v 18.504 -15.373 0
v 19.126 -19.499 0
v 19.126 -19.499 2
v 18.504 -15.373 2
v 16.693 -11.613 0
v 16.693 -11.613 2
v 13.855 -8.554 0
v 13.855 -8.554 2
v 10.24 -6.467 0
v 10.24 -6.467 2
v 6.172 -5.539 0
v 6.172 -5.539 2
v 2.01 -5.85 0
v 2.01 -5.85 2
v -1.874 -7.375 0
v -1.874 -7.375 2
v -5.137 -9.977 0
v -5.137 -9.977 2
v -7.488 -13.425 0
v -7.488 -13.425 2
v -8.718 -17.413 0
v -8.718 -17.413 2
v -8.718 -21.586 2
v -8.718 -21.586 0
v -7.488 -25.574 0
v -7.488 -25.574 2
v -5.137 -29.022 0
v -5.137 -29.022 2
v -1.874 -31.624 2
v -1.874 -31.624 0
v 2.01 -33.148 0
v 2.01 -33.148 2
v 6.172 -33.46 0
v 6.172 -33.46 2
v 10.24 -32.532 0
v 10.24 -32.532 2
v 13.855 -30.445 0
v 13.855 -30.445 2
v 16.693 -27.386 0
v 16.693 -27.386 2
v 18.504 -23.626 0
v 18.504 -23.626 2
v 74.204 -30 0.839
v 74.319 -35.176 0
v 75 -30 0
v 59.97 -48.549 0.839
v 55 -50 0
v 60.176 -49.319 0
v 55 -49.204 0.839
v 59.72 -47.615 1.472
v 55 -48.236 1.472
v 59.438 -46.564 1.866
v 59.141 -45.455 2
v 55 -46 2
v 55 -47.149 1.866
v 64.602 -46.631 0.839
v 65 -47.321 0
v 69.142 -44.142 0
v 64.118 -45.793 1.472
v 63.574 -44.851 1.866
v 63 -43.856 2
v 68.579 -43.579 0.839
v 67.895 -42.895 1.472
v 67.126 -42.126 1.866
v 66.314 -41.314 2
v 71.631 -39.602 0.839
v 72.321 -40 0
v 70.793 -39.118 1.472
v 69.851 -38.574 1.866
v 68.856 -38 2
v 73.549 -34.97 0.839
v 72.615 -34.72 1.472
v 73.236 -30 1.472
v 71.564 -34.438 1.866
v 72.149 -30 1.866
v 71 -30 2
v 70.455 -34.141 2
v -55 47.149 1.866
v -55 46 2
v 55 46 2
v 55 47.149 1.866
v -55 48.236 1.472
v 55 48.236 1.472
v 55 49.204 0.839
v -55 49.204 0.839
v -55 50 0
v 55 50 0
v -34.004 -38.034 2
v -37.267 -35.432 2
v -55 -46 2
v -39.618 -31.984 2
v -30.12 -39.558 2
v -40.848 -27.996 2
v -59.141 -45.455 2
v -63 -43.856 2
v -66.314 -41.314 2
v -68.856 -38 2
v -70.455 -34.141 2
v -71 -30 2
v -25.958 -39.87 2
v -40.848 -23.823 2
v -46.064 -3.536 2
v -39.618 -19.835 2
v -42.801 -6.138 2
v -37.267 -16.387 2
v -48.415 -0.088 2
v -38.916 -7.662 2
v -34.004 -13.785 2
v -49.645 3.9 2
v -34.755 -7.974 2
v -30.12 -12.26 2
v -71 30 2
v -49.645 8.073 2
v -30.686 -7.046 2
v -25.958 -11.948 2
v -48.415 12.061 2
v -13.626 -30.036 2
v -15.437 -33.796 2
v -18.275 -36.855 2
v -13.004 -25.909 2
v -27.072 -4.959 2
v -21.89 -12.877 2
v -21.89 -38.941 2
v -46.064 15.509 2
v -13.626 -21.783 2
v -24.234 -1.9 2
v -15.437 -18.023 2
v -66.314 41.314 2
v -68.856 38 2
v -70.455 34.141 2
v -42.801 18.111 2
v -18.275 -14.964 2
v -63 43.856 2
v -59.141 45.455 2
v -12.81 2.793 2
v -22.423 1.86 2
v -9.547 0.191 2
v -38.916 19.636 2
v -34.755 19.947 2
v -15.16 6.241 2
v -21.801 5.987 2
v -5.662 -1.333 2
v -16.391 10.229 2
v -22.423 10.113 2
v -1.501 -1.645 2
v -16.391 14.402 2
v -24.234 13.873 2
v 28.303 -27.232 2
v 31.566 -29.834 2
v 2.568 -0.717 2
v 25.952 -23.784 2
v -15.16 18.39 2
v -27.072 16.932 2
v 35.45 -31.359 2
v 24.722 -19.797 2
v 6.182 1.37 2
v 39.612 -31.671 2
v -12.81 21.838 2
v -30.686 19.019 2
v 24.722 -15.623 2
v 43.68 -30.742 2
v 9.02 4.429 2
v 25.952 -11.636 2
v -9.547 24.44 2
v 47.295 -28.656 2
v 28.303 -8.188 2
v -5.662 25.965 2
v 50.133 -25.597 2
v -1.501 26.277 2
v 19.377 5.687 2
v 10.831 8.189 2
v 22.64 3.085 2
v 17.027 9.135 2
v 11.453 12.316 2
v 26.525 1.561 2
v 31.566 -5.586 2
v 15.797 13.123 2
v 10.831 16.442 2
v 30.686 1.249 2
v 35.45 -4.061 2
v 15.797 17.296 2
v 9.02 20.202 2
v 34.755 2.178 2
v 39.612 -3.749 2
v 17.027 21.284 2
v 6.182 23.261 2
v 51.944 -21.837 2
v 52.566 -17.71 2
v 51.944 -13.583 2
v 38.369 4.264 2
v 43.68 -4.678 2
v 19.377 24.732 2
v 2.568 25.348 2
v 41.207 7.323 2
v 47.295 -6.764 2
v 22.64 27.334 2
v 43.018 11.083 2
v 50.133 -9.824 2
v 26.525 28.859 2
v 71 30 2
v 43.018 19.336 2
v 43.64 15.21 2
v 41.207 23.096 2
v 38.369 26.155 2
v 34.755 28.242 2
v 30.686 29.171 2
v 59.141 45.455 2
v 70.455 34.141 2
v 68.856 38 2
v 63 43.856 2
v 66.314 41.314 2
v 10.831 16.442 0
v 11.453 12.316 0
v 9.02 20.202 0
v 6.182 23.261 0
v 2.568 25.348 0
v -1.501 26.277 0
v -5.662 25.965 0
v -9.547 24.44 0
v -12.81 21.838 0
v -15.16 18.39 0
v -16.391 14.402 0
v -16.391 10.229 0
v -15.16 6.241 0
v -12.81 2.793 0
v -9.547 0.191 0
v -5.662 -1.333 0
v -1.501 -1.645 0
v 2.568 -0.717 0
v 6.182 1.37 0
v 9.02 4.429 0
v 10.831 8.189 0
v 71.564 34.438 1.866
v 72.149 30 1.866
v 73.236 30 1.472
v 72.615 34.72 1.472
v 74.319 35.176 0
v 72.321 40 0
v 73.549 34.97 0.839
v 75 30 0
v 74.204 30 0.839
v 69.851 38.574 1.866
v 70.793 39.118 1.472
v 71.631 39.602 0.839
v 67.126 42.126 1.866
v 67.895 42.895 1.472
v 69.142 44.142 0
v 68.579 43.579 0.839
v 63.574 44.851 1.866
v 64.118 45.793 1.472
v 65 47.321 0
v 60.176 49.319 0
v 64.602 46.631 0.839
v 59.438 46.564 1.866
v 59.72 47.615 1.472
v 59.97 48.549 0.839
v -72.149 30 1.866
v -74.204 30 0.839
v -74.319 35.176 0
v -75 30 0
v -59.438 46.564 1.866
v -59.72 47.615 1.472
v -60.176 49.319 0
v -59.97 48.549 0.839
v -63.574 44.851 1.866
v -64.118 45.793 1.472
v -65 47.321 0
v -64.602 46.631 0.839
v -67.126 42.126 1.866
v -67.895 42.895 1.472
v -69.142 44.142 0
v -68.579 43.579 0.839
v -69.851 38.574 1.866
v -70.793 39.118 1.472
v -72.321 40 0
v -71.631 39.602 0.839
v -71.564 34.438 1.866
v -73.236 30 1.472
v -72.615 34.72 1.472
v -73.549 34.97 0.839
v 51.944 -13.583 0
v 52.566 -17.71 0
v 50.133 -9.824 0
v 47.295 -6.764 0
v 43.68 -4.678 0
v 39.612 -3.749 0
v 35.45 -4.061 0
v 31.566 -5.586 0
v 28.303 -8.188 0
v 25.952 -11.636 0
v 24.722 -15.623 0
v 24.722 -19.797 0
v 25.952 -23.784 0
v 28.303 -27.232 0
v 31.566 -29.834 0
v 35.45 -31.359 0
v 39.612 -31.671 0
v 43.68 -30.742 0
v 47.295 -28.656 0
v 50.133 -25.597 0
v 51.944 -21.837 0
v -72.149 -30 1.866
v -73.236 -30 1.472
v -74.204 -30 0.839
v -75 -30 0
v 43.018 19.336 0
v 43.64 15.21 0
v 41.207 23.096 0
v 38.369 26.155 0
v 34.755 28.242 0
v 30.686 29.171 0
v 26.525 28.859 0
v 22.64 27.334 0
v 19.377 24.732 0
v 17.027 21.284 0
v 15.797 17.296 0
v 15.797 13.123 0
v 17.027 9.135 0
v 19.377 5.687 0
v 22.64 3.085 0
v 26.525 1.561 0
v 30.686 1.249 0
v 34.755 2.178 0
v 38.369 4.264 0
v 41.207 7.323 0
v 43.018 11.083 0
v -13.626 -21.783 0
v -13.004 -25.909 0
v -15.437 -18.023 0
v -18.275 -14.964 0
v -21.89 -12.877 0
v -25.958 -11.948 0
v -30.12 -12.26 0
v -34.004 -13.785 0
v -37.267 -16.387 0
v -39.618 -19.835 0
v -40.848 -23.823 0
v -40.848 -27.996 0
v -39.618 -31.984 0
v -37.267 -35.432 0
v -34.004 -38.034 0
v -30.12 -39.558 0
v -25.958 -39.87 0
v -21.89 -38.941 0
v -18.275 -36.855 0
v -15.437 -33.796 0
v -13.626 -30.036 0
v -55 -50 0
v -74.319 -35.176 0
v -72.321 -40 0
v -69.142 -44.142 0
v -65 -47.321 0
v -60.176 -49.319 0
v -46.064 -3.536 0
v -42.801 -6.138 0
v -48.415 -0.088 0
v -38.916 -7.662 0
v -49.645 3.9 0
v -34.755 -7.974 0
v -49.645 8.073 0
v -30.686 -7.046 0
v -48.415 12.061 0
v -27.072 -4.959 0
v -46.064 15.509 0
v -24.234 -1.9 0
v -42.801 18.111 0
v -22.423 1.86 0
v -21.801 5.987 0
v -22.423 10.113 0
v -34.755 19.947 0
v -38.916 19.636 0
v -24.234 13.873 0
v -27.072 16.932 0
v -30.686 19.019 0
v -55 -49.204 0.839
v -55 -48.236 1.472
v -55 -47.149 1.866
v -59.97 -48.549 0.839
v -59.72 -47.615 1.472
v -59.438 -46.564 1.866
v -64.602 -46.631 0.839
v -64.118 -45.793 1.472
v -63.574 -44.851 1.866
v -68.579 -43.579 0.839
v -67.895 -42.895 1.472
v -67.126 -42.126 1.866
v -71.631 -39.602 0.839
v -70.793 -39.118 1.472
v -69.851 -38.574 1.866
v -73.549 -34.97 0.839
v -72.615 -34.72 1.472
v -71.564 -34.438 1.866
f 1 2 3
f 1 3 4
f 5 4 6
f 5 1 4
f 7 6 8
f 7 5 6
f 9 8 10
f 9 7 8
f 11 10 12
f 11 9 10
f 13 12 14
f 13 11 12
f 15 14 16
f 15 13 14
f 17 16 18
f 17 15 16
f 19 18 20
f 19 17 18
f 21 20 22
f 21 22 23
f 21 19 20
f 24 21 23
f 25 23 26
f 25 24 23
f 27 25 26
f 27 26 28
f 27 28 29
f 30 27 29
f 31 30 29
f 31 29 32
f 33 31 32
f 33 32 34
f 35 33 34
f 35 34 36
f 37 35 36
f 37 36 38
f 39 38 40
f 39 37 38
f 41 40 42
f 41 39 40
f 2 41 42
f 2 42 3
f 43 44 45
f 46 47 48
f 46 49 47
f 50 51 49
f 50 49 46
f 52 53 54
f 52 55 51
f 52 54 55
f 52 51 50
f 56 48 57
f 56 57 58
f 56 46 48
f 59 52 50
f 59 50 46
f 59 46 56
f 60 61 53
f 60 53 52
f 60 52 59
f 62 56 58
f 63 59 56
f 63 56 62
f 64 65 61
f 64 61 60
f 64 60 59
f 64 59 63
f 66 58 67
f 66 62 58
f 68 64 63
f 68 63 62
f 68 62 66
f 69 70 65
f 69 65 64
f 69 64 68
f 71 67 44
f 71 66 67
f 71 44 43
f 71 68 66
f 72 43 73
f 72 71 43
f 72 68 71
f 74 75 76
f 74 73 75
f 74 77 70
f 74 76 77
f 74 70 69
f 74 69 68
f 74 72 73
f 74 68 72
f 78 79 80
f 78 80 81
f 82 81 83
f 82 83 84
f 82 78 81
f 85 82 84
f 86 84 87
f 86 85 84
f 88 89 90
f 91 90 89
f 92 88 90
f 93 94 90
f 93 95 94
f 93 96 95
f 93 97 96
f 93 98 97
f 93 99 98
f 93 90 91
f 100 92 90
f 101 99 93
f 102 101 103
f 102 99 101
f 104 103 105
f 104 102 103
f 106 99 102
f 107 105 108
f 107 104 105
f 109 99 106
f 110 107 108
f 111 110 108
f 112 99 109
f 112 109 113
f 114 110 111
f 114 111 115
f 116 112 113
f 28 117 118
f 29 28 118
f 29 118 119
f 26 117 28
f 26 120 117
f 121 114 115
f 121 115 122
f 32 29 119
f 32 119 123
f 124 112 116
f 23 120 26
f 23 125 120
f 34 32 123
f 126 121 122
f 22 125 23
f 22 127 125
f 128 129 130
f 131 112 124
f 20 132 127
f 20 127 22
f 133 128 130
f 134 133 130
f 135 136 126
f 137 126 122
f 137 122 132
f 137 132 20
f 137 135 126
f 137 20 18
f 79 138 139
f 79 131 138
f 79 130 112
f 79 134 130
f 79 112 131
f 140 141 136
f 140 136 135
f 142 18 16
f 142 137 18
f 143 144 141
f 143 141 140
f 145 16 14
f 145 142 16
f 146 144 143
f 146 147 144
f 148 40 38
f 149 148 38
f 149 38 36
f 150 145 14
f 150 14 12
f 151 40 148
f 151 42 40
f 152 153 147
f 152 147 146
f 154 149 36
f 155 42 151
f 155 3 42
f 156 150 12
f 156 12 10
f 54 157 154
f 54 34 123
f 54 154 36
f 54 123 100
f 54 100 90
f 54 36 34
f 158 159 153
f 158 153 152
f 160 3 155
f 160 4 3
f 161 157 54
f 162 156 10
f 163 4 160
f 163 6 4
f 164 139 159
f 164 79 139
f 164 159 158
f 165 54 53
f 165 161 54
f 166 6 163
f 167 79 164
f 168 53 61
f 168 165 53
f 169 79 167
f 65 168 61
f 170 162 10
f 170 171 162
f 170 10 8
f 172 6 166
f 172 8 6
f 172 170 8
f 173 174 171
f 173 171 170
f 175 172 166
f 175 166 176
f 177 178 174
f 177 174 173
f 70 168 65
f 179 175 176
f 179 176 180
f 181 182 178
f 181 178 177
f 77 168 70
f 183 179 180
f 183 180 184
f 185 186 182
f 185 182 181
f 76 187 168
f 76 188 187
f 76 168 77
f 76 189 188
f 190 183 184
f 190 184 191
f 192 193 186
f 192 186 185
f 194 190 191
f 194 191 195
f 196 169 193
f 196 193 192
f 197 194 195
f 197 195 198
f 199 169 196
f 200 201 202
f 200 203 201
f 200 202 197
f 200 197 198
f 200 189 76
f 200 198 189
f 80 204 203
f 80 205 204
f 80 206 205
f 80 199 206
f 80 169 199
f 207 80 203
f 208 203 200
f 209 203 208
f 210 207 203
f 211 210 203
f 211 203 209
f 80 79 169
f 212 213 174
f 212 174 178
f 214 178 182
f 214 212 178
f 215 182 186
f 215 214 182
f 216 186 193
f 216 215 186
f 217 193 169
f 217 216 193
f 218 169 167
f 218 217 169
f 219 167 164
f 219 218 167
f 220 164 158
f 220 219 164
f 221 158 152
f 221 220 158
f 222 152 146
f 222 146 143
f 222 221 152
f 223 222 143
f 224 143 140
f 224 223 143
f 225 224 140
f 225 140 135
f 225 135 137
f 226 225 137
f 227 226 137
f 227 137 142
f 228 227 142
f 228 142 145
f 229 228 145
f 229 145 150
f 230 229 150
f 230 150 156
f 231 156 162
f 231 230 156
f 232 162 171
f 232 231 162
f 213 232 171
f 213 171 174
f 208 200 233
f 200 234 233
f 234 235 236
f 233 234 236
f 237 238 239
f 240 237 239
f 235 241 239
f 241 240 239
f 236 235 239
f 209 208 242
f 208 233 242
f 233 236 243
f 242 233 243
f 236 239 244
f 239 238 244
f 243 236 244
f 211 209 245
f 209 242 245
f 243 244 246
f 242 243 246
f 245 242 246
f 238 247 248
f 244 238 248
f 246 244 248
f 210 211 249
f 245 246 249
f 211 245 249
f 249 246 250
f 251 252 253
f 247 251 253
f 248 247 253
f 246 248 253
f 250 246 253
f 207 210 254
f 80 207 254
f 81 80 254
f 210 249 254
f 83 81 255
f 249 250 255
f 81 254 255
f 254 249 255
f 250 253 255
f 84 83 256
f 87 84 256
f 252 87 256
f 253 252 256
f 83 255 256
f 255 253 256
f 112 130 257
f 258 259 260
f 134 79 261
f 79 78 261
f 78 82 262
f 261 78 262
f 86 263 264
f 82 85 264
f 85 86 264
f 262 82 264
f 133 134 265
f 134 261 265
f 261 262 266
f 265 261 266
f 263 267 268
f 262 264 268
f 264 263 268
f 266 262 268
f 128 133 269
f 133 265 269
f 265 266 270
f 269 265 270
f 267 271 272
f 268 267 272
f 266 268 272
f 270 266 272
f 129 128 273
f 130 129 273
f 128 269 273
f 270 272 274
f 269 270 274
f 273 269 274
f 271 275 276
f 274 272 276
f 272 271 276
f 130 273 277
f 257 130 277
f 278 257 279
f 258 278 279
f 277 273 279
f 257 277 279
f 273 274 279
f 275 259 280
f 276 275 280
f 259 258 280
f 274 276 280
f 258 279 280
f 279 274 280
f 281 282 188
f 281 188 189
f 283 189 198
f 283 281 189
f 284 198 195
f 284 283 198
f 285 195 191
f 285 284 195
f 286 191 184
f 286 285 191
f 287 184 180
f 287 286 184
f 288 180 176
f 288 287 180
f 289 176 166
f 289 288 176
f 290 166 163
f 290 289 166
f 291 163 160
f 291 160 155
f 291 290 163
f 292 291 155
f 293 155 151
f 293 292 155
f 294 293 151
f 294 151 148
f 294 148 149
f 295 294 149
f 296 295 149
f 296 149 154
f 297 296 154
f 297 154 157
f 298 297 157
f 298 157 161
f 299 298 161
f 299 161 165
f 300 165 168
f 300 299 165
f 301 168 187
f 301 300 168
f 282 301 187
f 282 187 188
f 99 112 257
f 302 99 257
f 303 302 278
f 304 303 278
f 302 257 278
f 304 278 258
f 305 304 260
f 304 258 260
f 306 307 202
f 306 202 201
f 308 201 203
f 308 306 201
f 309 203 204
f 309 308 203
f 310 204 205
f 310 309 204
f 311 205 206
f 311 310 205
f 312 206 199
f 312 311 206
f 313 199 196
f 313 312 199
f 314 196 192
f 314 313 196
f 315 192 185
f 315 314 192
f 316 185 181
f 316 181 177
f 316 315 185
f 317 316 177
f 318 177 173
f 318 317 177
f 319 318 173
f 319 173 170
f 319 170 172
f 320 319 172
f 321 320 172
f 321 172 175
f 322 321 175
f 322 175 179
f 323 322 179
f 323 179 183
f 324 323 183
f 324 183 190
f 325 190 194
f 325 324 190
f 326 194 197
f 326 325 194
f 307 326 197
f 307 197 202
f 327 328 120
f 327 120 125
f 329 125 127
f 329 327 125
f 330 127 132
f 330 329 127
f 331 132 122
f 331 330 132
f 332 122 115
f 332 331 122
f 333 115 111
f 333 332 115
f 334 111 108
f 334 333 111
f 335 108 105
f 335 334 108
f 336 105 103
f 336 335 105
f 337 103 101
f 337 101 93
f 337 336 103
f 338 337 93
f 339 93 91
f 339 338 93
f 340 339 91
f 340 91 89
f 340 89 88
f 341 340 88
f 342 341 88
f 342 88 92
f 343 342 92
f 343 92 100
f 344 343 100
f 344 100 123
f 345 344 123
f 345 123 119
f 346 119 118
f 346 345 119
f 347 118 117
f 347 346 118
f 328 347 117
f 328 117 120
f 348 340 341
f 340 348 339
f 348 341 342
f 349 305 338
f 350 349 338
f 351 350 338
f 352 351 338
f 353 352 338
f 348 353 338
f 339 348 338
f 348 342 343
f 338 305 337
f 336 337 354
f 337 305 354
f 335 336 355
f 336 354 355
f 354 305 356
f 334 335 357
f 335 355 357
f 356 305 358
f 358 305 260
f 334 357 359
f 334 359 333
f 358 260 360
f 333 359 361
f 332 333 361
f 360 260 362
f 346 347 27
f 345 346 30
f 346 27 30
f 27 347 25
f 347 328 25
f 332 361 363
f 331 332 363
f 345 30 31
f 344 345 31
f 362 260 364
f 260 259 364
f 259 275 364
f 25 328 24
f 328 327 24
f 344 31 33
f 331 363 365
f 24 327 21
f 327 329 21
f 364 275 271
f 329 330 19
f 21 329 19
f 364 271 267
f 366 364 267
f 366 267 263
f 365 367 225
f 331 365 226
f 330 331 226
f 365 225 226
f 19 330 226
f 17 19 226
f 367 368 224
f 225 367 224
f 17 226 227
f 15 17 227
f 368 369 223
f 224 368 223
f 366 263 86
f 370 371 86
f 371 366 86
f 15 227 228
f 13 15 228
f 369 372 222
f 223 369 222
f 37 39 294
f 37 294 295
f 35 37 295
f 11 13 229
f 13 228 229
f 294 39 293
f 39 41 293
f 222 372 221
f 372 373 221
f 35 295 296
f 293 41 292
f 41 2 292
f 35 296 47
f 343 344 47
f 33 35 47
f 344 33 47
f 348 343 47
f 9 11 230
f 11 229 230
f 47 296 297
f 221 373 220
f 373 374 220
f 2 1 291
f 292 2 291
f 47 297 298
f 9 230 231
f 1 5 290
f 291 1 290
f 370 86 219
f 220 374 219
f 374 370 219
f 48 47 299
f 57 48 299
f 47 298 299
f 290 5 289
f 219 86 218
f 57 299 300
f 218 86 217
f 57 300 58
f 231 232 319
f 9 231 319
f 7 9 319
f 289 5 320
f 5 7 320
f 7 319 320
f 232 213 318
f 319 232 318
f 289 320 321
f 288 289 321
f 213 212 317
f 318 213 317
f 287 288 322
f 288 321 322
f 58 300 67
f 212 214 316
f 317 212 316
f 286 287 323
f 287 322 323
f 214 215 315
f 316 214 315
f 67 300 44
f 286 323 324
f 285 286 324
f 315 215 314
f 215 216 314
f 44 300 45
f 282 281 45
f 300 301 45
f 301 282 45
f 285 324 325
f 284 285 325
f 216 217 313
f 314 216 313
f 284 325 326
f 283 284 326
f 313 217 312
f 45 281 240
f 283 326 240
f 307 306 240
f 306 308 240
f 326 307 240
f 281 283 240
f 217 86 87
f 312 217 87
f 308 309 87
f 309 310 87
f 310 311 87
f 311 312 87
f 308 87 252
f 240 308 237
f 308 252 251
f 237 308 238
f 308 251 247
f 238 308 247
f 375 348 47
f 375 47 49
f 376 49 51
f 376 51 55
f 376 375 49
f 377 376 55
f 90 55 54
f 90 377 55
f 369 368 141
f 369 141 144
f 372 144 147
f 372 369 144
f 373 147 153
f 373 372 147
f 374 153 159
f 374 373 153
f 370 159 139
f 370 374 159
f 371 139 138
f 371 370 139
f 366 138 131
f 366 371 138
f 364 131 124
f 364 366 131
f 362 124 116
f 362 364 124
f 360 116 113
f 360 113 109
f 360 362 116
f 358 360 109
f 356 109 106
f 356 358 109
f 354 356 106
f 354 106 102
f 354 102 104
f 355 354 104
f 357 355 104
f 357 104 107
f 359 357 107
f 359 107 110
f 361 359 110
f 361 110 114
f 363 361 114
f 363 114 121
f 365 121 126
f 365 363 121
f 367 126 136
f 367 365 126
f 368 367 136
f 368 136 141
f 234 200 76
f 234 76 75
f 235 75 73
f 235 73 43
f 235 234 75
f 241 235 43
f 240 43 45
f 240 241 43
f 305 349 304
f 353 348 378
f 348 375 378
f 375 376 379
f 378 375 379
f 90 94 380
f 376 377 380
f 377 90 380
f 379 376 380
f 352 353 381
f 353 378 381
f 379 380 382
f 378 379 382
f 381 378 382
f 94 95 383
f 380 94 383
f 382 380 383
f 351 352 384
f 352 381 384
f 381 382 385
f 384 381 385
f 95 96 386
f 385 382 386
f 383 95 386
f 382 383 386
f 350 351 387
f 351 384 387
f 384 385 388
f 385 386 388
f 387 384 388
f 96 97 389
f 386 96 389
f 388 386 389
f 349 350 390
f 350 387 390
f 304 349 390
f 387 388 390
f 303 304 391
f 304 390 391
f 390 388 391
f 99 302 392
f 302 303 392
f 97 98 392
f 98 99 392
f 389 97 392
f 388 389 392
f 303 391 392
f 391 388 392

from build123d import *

# Parameters (mm, degrees)
F0_W         = 150
F0_H         = 100
F0_R         = 14
F1_DEPTH     = 2
F2_R         = 20
F3_T1_DEPTH  = 110
F3_T3_DEPTH  = 60
F3_T6_ANGLE  = 90
F3_T8_ANGLE  = 90
F3_T10_ANGLE = 90
F3_T12_ANGLE = 90


# Not quite as in the source:
# - a fillet or chamfer that OpenCascade refuses, or shapes differently, is made with other operations: its cross-section is extruded or revolved along the edge and cut away or added


with BuildPart() as f1:
    # F0 (on Top) → F1 (new body)
    with BuildSketch(Plane.XY):
        Rectangle(F0_W, F0_H)
        with Locations((-27.0043395302, -25.9092412172)):
            Circle(F0_R, mode=Mode.SUBTRACT)
        with Locations((5.1257033043, -19.4994347856)):
            Circle(F0_R, mode=Mode.SUBTRACT)
        with Locations((38.5656639238, -17.7100679294)):
            Circle(F0_R, mode=Mode.SUBTRACT)
        with Locations((-35.8011273407, 5.9865840333)):
            Circle(F0_R, mode=Mode.SUBTRACT)
        with Locations((-2.5469161856, 12.3156928879)):
            Circle(F0_R, mode=Mode.SUBTRACT)
        with Locations((29.6401518762, 15.2098077585)):
            Circle(F0_R, mode=Mode.SUBTRACT)
    extrude(amount=F1_DEPTH)

    # F2
    f2_edges = [f1.edges().sort_by_distance(p)[0] for p in [
        (-75, -50, 1),
        (75, -50, 1),
        (-75, 50, 1),
        (75, 50, 1),
    ]]
    fillet(f2_edges, radius=F2_R)

    # F3: fillet of radius 5 on 2 edges, made by hand

    # F3_s2 → F3_t1 (cut)
    with BuildSketch(Plane.YZ.offset(-55)):
        with BuildLine():
            ThreePointArc((-50, 0), (-48.2360679775, 1.472135955), (-46, 2))
            Line((-46, 2), (-50, 2))
            Line((-50, 2), (-50, 0))
        make_face()
        with BuildLine():
            ThreePointArc((46, 2), (48.2360679775, 1.472135955), (50, 0))
            Line((50, 0), (50, 2))
            Line((50, 2), (46, 2))
        make_face()
    extrude(amount=F3_T1_DEPTH, mode=Mode.SUBTRACT)

    # F3_s4 → F3_t3 (cut)
    with BuildSketch(Plane.XZ.offset(-30)):
        with BuildLine():
            ThreePointArc((-71, 2), (-73.2360679775, 1.472135955), (-75, 0))
            Line((-75, 0), (-75, 2))
            Line((-75, 2), (-71, 2))
        make_face()
        with BuildLine():
            ThreePointArc((71, 2), (73.2360679775, 1.472135955), (75, 0))
            Line((75, 0), (75, 2))
            Line((75, 2), (71, 2))
        make_face()
    extrude(amount=F3_T3_DEPTH, mode=Mode.SUBTRACT)

    # F3_s5 → F3_t6 (revolve, cut)
    with BuildSketch(Plane.YZ.offset(-55)):
        with BuildLine():
            ThreePointArc((-50, 0), (-48.2360679775, 1.472135955), (-46, 2))
            Line((-46, 2), (-50, 2))
            Line((-50, 2), (-50, 0))
        make_face()
    revolve(axis=Axis((-55, -30, 2), (0, 0, -1)), revolution_arc=F3_T6_ANGLE, mode=Mode.SUBTRACT)

    # F3_s7 → F3_t8 (revolve, cut)
    with BuildSketch(Plane.YZ.offset(-55)):
        with BuildLine():
            ThreePointArc((46, 2), (48.2360679775, 1.472135955), (50, 0))
            Line((50, 0), (50, 2))
            Line((50, 2), (46, 2))
        make_face()
    revolve(axis=Axis((-55, 30, 2), (0, 0, 1)), revolution_arc=F3_T8_ANGLE, mode=Mode.SUBTRACT)

    # F3_s9 → F3_t10 (revolve, cut)
    with BuildSketch(Plane.XZ.offset(-30)):
        with BuildLine():
            ThreePointArc((71, 2), (73.2360679775, 1.472135955), (75, 0))
            Line((75, 0), (75, 2))
            Line((75, 2), (71, 2))
        make_face()
    revolve(axis=Axis((55, 30, 2), (0, 0, 1)), revolution_arc=F3_T10_ANGLE, mode=Mode.SUBTRACT)

    # F3_s11 → F3_t12 (revolve, cut)
    with BuildSketch(Plane.YZ.offset(55)):
        with BuildLine():
            ThreePointArc((-50, 0), (-48.2360679775, 1.472135955), (-46, 2))
            Line((-46, 2), (-50, 2))
            Line((-50, 2), (-50, 0))
        make_face()
    revolve(axis=Axis((55, -30, 2), (0, 0, 1)), revolution_arc=F3_T12_ANGLE, mode=Mode.SUBTRACT)


solid = f1.part
